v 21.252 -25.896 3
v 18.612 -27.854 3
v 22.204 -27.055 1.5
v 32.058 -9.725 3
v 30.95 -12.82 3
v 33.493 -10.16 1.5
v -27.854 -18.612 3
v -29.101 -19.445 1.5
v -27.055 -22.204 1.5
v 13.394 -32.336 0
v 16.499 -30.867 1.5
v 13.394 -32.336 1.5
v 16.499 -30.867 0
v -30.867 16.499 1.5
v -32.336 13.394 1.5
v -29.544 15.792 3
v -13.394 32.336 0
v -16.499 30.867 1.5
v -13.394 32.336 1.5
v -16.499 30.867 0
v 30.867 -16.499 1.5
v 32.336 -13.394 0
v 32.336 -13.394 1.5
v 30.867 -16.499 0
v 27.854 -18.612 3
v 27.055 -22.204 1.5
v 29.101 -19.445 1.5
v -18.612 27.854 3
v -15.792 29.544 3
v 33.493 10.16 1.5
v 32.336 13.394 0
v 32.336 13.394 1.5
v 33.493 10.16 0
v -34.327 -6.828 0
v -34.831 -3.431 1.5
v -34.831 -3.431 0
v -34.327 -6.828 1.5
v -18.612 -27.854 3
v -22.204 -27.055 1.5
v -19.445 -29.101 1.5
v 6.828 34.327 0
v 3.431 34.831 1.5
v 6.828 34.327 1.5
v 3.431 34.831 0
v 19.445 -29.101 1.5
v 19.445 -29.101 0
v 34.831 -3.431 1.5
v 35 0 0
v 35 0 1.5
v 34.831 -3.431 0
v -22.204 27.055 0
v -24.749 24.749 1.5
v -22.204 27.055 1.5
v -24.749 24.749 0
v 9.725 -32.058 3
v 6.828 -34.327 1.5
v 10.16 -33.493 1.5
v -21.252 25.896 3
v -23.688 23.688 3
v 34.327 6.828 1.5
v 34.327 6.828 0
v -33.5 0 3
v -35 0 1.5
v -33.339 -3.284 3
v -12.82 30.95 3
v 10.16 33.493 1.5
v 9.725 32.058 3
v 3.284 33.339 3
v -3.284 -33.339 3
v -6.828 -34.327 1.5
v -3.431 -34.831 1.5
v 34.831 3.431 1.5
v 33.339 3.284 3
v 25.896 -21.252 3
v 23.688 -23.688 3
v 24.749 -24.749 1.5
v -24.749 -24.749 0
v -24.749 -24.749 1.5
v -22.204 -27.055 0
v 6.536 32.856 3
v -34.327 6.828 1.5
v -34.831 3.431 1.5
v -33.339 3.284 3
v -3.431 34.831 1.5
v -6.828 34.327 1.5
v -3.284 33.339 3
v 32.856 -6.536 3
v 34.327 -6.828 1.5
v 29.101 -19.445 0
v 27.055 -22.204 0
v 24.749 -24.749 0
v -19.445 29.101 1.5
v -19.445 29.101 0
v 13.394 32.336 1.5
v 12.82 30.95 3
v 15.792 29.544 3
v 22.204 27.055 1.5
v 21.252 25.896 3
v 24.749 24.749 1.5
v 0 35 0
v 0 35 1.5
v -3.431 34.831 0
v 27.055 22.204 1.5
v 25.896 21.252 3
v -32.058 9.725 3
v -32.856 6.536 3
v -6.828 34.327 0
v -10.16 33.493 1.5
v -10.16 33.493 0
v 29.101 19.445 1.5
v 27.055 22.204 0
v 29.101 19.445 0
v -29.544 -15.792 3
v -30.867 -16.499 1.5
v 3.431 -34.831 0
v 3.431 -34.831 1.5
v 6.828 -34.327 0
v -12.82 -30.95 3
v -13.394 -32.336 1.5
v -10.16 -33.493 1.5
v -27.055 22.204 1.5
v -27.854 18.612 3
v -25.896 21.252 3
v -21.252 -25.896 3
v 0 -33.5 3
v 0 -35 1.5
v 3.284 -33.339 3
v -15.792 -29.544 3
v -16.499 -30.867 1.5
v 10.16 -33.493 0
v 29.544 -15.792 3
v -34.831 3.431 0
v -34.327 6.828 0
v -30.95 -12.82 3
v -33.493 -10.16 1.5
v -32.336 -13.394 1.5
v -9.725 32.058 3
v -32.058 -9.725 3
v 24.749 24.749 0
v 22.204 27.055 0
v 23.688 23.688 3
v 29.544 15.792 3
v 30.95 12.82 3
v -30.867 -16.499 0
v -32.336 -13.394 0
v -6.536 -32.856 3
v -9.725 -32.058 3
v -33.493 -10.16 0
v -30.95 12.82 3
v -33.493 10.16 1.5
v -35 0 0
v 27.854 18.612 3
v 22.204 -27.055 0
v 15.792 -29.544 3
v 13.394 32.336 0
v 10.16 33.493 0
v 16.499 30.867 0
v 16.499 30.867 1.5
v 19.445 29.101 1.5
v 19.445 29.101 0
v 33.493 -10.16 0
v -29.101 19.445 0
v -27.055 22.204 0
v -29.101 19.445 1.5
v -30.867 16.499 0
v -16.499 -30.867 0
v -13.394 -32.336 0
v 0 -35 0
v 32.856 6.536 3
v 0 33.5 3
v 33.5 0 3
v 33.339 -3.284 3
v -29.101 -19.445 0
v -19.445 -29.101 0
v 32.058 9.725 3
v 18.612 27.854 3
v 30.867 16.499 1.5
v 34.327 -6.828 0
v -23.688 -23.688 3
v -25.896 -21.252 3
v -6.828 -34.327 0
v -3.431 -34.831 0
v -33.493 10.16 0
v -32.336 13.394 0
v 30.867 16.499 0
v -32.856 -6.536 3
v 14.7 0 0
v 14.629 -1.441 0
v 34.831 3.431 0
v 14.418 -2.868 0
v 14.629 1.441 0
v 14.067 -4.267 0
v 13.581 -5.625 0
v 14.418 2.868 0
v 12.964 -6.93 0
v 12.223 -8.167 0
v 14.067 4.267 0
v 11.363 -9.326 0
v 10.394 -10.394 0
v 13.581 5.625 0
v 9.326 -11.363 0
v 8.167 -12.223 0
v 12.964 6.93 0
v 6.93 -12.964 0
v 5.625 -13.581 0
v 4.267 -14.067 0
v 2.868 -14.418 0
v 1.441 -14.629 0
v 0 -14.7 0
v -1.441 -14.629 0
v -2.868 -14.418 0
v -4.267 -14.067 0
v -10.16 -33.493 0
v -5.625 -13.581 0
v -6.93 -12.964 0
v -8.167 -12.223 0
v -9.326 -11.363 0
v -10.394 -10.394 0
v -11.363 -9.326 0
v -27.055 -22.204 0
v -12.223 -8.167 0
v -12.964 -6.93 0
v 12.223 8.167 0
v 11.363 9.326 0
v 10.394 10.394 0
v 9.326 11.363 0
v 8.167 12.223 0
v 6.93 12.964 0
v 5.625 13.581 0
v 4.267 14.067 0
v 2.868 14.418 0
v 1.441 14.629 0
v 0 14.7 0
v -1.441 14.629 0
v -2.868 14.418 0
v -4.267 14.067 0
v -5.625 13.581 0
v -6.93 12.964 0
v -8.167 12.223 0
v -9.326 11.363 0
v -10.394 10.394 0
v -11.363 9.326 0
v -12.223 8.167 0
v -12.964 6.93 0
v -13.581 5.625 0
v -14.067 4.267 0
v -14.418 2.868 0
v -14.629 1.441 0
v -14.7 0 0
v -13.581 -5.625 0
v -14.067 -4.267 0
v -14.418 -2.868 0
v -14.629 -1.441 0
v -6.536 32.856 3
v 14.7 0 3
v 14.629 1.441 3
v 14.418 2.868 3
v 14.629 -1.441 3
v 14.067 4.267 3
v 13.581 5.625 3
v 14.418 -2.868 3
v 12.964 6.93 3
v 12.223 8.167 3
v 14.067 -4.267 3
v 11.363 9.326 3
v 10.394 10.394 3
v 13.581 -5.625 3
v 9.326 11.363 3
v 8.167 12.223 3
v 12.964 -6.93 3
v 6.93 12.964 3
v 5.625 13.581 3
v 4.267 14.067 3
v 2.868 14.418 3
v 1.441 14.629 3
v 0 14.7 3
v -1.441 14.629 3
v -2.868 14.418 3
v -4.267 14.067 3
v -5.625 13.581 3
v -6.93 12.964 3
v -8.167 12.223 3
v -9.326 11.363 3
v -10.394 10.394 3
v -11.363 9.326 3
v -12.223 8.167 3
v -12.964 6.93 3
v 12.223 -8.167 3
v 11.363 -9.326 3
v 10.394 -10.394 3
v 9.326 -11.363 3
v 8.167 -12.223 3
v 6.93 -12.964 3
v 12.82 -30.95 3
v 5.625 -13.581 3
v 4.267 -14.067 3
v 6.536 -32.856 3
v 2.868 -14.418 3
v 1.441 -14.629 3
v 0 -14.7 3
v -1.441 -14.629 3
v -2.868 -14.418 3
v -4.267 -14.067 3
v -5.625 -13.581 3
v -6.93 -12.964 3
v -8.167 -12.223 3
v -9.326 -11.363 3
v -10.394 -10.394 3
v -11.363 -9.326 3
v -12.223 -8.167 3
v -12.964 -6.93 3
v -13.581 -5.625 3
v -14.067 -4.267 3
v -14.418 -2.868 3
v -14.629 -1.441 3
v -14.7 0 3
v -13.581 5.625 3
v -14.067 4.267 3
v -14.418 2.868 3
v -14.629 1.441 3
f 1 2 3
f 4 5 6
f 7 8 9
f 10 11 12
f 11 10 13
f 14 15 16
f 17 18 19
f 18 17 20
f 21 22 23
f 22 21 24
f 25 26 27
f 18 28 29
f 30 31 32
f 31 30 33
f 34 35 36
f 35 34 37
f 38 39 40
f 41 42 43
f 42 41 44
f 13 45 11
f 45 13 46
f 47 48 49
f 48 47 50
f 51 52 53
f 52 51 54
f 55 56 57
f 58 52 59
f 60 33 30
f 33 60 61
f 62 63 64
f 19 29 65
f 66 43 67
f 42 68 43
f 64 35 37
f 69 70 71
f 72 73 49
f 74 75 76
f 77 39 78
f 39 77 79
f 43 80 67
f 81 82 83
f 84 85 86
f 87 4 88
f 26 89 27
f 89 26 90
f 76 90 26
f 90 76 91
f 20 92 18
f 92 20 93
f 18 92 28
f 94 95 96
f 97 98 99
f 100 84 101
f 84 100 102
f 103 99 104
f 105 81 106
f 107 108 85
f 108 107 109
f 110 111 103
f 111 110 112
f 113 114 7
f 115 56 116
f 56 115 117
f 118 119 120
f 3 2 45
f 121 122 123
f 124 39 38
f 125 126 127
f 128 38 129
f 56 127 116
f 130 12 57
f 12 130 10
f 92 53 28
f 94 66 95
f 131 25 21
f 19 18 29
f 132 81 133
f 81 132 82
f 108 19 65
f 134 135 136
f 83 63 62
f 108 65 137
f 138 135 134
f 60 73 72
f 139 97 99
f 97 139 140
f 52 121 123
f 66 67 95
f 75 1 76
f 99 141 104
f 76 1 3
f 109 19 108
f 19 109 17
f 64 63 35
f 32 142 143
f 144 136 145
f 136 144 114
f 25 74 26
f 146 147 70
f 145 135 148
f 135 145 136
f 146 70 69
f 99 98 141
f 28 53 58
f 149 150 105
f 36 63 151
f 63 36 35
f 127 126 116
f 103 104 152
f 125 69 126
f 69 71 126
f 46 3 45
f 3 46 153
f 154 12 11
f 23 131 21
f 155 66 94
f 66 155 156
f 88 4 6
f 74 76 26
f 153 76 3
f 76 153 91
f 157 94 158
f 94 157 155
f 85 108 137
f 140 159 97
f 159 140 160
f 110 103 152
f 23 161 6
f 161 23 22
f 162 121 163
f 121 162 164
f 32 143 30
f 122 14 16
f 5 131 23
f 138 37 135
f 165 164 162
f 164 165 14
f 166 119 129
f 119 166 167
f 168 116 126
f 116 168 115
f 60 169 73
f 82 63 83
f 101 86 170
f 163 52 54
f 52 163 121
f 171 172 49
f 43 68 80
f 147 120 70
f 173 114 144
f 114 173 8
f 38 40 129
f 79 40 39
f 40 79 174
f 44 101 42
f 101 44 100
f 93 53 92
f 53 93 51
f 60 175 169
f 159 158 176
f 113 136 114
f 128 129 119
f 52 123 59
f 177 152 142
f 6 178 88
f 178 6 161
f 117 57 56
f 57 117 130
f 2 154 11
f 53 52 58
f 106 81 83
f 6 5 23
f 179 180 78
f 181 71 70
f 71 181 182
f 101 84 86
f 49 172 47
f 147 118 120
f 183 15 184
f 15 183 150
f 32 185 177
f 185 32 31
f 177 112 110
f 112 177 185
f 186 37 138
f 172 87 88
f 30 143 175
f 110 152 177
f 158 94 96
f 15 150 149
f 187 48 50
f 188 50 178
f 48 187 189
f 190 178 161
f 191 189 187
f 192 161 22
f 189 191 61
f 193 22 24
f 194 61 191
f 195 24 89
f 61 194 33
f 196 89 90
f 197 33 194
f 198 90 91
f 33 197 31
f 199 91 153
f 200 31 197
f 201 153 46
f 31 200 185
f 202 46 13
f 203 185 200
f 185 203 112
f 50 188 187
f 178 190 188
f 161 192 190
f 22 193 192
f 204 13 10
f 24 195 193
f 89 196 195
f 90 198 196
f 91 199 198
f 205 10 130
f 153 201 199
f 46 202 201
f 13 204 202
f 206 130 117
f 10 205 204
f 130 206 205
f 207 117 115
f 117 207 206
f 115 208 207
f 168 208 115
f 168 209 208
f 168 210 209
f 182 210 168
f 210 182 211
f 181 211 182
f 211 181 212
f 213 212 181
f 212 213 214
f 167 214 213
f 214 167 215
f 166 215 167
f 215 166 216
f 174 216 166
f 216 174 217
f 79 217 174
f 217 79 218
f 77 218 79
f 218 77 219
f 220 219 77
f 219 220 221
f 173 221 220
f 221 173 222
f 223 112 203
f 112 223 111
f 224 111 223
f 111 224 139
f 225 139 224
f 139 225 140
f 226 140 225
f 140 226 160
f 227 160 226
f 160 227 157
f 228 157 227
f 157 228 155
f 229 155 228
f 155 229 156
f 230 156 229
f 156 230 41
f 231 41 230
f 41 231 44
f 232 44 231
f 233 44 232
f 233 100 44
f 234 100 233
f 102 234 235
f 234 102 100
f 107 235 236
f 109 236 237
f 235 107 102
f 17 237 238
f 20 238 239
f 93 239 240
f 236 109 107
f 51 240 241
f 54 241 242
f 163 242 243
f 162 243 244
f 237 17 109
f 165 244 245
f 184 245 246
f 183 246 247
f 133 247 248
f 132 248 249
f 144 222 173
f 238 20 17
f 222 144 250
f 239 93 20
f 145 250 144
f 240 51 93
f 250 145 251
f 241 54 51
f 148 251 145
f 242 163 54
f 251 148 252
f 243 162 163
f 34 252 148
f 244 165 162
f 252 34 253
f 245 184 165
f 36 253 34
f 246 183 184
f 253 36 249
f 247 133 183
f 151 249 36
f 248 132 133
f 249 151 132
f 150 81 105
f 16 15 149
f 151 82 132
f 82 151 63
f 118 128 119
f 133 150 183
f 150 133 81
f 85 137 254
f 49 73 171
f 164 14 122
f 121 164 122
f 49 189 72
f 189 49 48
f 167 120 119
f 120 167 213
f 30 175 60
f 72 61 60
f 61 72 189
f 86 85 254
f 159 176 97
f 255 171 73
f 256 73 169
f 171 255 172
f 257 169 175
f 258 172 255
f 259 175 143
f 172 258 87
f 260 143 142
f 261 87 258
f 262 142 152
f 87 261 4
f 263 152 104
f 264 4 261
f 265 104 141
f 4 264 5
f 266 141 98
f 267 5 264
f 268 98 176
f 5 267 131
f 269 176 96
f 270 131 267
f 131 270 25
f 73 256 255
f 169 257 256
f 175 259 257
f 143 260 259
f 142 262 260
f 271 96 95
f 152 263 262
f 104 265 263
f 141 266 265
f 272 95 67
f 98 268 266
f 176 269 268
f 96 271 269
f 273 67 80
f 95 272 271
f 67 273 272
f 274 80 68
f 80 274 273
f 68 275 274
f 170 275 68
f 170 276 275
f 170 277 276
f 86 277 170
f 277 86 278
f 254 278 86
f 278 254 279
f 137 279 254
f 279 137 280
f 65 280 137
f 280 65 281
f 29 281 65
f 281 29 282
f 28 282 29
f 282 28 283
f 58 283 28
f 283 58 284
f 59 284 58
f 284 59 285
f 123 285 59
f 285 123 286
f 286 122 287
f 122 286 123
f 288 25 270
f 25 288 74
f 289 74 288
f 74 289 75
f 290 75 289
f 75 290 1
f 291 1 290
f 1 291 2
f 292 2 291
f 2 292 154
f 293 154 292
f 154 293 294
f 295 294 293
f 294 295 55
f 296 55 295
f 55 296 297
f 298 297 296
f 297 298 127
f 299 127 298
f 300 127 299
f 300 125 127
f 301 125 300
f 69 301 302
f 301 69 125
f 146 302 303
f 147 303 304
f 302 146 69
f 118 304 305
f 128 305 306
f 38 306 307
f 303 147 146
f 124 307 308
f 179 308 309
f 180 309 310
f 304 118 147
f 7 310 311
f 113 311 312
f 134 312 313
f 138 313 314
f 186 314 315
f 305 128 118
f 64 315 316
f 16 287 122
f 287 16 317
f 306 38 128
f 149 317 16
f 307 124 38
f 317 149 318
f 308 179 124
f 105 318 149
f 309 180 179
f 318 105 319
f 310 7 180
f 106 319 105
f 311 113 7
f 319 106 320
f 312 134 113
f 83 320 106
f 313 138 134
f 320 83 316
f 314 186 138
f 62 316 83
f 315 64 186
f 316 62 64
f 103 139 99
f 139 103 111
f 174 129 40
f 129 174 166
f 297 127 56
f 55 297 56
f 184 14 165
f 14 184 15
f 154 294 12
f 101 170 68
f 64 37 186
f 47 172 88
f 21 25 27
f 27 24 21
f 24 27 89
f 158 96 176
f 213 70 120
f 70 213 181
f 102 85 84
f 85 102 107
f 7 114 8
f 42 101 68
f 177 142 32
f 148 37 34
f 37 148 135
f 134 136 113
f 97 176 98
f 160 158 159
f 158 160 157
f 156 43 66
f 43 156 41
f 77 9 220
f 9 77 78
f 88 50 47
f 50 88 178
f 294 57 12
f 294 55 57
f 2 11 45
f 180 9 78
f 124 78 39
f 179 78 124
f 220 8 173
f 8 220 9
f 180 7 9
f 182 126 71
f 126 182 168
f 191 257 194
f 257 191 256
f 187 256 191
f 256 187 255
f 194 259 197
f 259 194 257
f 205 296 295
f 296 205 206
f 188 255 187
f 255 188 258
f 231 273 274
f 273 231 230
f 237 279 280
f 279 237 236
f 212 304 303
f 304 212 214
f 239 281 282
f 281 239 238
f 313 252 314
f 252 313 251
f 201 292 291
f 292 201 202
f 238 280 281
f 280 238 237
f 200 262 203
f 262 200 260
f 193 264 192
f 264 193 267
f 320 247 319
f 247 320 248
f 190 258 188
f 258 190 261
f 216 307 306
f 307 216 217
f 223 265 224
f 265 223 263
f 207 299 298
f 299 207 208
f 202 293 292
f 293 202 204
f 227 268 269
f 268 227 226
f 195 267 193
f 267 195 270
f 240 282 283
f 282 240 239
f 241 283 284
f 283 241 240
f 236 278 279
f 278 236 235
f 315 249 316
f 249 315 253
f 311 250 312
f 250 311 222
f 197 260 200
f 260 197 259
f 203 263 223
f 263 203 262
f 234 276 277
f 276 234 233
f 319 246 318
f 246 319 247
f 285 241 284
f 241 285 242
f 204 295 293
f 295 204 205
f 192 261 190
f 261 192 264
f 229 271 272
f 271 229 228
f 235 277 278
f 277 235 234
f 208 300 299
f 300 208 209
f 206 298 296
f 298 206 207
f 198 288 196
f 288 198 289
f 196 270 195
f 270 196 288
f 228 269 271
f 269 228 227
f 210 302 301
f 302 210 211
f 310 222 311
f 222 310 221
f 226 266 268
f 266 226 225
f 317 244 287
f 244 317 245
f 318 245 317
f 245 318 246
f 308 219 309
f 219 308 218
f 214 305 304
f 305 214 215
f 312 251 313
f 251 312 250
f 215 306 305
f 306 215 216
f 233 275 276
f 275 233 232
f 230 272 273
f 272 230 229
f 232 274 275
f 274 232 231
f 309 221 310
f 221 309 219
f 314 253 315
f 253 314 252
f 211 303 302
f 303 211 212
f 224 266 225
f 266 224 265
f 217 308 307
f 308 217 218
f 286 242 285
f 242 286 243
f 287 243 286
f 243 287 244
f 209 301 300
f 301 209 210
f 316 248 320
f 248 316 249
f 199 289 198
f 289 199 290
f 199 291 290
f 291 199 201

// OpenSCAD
// Parametric Escutcheon (pipe cover plate)
// Parameters are injected via OpenSCAD -D flags

// Pipe outer diameter - the hole (mm)
pipe_od = 28.4;  // ~1" copper pipe OD
// Plate outer diameter (mm)
plate_od = 70;
// Plate thickness (mm)
thickness = 3;
// Edge chamfer size (mm, 0 = no chamfer)
chamfer = 1.5;
// Gap tolerance added to pipe hole (mm)
gap = 0.5;
// Resolution
$fn = 64;

hole_d = pipe_od + gap * 2;

module escutcheon() {
    difference() {
        // Main plate with optional chamfer
        if (chamfer > 0) {
            hull() {
                // Bottom disc (full size)
                cylinder(h = thickness - chamfer, d = plate_od);
                // Top disc (smaller, for chamfer)
                translate([0, 0, thickness - chamfer])
                    cylinder(h = chamfer, d1 = plate_od, d2 = plate_od - chamfer * 2);
            }
        } else {
            cylinder(h = thickness, d = plate_od);
        }

        // Center hole for pipe
        translate([0, 0, -0.1])
            cylinder(h = thickness + 0.2, d = hole_d);
    }
}

escutcheon();
